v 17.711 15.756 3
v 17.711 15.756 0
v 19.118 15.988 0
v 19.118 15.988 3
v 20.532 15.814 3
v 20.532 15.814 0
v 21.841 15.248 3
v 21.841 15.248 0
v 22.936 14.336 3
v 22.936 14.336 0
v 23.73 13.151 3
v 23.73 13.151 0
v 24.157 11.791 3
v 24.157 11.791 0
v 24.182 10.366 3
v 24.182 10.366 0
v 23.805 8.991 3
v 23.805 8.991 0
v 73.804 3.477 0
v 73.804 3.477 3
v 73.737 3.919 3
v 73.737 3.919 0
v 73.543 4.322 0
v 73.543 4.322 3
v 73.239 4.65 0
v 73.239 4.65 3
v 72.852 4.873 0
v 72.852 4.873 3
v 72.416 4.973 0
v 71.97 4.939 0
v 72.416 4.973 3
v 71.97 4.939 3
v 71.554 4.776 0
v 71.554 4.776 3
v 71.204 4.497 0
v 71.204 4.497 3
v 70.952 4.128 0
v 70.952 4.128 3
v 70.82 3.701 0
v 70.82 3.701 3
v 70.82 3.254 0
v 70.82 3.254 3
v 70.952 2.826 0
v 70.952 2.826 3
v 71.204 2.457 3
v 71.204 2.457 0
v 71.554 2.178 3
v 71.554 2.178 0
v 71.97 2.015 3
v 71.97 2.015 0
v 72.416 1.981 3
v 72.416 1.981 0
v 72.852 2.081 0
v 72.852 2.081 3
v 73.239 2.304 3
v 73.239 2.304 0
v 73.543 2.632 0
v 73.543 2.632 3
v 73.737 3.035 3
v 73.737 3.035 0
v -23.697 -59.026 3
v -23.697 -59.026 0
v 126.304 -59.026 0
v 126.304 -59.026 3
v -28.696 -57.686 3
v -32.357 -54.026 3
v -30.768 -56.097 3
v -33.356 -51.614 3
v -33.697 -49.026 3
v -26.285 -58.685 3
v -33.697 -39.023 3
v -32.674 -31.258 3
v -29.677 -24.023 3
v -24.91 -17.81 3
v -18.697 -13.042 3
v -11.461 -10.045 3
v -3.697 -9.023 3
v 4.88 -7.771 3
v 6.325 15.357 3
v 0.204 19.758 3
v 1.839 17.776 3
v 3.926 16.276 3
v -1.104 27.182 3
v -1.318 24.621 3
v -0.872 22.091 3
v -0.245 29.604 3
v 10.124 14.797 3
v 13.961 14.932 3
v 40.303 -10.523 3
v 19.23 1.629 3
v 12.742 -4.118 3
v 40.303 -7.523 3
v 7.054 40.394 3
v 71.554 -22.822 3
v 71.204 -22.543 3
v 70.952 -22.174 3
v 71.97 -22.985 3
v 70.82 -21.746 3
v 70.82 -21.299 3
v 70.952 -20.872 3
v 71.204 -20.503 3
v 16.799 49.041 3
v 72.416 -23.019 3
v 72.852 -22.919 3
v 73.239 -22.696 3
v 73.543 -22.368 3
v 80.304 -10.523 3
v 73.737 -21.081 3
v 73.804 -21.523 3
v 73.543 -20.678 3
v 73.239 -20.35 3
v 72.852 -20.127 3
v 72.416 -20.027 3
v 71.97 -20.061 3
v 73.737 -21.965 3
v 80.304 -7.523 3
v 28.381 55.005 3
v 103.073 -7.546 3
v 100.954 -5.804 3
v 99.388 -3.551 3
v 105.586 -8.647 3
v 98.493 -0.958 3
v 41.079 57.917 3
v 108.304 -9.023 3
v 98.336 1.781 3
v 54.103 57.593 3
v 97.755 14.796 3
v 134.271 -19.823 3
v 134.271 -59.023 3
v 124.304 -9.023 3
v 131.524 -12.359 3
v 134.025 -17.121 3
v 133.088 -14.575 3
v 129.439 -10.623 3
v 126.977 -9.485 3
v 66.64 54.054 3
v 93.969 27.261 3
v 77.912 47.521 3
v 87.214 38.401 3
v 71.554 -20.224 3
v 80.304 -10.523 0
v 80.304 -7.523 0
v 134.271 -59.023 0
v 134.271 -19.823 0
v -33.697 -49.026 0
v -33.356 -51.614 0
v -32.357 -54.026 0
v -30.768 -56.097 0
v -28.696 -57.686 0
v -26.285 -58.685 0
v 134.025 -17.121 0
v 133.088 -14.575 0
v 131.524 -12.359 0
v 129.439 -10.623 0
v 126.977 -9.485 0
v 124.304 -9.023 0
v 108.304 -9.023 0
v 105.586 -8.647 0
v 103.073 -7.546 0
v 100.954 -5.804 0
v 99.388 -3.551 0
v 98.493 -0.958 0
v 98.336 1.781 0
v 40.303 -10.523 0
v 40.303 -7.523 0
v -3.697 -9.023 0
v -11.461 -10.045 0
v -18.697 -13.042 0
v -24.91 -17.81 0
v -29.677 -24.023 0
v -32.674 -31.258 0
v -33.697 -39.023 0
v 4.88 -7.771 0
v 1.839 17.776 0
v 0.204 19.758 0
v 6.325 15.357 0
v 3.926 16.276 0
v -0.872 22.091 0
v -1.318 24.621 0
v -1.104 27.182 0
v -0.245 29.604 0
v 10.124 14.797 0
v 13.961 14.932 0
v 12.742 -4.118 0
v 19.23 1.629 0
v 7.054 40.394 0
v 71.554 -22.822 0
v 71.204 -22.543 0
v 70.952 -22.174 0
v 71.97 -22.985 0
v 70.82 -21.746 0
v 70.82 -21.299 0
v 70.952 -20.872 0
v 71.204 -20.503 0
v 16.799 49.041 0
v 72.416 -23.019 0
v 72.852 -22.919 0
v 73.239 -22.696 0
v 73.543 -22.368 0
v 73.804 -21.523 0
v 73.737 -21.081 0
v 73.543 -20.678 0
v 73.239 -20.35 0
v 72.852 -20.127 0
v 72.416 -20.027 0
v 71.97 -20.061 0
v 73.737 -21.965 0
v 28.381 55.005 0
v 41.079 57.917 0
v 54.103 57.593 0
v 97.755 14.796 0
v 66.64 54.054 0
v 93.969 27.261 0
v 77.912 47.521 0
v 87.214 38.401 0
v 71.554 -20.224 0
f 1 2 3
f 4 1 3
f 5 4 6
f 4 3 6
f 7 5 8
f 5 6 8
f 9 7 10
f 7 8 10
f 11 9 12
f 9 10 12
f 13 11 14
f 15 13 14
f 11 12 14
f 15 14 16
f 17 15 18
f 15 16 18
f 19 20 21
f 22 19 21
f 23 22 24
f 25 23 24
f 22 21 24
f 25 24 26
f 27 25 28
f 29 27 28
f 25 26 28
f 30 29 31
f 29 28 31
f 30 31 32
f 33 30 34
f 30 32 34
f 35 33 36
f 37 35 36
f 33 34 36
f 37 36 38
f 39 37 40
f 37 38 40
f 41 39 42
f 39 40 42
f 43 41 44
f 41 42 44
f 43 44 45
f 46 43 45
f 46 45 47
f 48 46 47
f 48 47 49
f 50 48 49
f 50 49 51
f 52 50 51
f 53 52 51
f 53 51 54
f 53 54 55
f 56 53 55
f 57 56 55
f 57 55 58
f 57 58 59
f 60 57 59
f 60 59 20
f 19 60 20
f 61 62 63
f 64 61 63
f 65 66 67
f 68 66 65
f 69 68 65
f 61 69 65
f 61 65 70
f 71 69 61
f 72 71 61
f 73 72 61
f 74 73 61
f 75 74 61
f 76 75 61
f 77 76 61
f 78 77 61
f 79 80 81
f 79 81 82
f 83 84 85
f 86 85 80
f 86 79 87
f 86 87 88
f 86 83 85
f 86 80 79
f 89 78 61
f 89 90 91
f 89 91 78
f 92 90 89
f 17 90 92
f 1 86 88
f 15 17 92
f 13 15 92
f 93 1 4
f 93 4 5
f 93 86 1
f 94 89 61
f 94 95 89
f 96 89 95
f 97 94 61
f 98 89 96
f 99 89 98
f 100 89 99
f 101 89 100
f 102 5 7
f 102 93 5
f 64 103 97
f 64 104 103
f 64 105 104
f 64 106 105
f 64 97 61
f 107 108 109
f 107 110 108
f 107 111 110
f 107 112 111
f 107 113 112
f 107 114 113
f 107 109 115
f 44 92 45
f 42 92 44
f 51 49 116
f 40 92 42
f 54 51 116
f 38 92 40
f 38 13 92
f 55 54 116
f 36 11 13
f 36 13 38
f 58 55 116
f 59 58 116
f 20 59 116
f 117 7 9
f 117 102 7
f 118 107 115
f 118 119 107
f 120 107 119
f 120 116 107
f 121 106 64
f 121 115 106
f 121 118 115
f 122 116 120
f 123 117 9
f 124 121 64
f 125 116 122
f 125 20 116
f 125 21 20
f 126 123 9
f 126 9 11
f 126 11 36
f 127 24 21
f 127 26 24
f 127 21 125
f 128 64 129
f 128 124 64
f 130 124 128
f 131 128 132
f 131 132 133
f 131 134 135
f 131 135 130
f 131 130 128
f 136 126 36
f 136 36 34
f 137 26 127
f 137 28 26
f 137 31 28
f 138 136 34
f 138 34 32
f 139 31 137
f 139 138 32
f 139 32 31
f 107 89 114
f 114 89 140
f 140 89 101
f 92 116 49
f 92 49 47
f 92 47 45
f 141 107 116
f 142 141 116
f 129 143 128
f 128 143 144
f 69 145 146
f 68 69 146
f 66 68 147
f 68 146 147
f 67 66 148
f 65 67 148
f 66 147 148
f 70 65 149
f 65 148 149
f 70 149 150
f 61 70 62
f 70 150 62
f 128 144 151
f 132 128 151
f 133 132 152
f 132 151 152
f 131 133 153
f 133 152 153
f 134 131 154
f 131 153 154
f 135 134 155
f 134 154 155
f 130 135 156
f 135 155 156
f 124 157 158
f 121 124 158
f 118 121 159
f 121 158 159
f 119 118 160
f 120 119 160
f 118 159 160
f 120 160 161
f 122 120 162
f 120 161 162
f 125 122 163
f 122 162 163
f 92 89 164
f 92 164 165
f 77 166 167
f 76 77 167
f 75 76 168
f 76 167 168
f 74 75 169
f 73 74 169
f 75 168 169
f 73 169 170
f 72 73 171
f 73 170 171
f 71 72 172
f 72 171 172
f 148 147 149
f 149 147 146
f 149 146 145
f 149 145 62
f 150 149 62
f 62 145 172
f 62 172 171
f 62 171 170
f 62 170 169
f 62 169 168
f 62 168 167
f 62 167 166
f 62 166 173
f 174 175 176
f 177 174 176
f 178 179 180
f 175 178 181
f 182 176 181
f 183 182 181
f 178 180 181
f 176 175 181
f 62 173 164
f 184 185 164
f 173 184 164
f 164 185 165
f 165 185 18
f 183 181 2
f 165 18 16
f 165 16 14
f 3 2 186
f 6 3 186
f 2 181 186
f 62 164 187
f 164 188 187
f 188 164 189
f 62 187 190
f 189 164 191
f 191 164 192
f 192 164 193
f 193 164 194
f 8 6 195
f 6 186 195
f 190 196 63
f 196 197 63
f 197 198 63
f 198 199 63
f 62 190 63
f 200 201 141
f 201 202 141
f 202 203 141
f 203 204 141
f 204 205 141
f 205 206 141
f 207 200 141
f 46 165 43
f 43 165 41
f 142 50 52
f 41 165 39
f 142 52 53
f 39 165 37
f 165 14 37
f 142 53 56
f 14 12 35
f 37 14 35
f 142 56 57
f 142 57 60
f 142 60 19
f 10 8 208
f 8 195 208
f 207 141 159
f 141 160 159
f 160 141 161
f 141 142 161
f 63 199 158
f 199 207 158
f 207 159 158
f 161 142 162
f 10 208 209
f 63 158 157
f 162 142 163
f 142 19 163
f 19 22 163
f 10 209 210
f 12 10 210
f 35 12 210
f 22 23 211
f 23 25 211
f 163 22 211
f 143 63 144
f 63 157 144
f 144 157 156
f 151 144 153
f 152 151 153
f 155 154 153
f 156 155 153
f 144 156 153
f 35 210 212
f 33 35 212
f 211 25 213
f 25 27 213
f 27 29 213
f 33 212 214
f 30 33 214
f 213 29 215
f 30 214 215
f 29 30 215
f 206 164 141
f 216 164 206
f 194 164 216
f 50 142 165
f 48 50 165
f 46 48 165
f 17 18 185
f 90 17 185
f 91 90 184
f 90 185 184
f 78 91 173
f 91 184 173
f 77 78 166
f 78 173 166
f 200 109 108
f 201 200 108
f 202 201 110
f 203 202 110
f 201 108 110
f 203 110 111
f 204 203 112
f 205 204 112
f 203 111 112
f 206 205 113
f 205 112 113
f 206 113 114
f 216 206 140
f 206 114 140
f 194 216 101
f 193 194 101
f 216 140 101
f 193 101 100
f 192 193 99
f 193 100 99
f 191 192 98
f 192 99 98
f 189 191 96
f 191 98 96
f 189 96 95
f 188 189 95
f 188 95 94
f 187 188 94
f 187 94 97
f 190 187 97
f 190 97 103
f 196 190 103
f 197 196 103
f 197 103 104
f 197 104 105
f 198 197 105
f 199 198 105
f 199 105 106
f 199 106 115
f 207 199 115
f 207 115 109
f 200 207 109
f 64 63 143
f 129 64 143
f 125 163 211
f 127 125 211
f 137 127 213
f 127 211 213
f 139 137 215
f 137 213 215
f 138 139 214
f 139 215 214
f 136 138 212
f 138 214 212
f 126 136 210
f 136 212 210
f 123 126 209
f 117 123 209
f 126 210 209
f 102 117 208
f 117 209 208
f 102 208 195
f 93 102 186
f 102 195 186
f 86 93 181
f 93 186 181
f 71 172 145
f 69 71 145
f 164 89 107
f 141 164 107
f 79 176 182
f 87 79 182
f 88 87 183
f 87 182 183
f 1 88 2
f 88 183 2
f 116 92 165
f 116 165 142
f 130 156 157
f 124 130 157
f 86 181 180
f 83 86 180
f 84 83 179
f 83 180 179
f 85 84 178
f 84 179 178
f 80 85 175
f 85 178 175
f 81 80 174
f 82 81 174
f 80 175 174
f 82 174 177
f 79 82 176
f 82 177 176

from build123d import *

# Parameters (mm, degrees)
RESSALTO_EXTRUS_O1_DEPTH = 3
ESBO_O2_W                = 40.000247185
ESBO_O2_H                = 3
CORTE_EXTRUS_O1_DEPTH    = 147.710752088
ESBO_O3_R                = 1.5
CORTE_EXTRUS_O2_DEPTH    = 147.710752088


with BuildPart() as part:
    # Esboço1 → Ressalto-extrusão1 (new body)
    with BuildSketch(Plane.XY):
        with BuildLine():
            Line((-23.696540285, -59.026029985), (126.303641818, -59.026029985))
            Line((126.303641818, -59.026029985), (134.27116449, -59.022933245))
            Line((134.27116449, -59.022933245), (134.27116449, -19.822933247))
            ThreePointArc((134.27116449, -19.822933247), (131.52375333, -12.35888539), (124.30352468, -9.022933247))
            Line((124.30352468, -9.022933247), (108.30352468, -9.022933247))
            ThreePointArc((108.30352468, -9.022933247), (100.95374961, -5.803848113), (98.335884873, 1.780905469))
            ThreePointArc((98.335884873, 1.780905469), (60.482361862, 56.216031378), (-0.245391502, 29.603776524))
            ThreePointArc((-0.245391502, 29.603776524), (-0.409038284, 20.889653739), (6.32530272, 15.356899684))
            ThreePointArc((6.32530272, 15.356899684), (12.045479144, 14.777616646), (17.711135048, 15.755538086))
            ThreePointArc((17.711135048, 15.755538086), (22.936163149, 14.335796242), (23.805019321, 8.991483891))
            ThreePointArc((23.805019321, 8.991483891), (12.741533396, -4.118425729), (-3.696722505, -9.022933247))
            ThreePointArc((-3.696722505, -9.022933247), (-24.90992594, -17.809729811), (-33.696722505, -39.022933247))
            Line((-33.696722505, -39.022933247), (-33.696540284, -49.026212146))
            ThreePointArc((-33.696540284, -49.026212146), (-30.767543693, -56.0971622), (-23.696540285, -59.026029985))
        make_face()
    extrude(amount=RESSALTO_EXTRUS_O1_DEPTH)

    # Esboço2 → Corte-extrusão1 (cut, through all)
    with BuildSketch(Plane.XY.offset(3)):
        with Locations((60.303401088, -9.022933247)):
            Rectangle(ESBO_O2_W, ESBO_O2_H)
    extrude(amount=-CORTE_EXTRUS_O1_DEPTH, mode=Mode.SUBTRACT)

    # Esboço3 → Corte-extrusão2 (cut, through all)
    with BuildSketch(Plane.XY.offset(3)):
        with Locations((72.30352468, 3.477066753)):
            Circle(ESBO_O3_R)
        with Locations((72.30352468, -21.522933247)):
            Circle(ESBO_O3_R)
    extrude(amount=-CORTE_EXTRUS_O2_DEPTH, mode=Mode.SUBTRACT)


solid = part.part
